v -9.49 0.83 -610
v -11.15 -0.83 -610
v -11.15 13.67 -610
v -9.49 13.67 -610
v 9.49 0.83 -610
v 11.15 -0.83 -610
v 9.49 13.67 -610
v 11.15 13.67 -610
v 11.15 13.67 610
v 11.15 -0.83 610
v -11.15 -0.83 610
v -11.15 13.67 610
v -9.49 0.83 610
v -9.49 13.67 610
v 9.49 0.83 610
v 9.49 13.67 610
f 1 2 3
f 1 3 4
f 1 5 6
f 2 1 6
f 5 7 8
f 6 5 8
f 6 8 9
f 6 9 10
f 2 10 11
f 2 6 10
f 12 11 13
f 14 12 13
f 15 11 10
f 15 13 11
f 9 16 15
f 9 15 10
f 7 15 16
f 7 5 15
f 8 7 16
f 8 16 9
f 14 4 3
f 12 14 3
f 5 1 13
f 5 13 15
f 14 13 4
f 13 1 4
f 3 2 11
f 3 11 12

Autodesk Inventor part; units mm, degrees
ref_plane "YZ Plane" through (0, 0, 0) normal (1, 0, 0) x (0, 1, 0)
ref_plane "XZ Plane" through (0, 0, 0) normal (0, 1, 0) x (-1, 0, 0)
ref_plane "XY Plane" through (0, 0, 0) normal (0, 0, 1) x (1, 0, 0)
sketch "Sketch1" plane through (0, 0, 0) normal (0, 0, 1) x (1, 0, 0)
  line L0 (-9.49, 0.83) -> (9.49, 0.83)
  line L1 (11.15, 1.3646) -> (11.15, -0.83)
  line L2 (11.15, -0.83) -> (-11.15, -0.83)
  line L3 (-11.15, -0.83) -> (-11.15, 1.0973)
  line L4 (-9.49, 0.83) -> (-9.49, 13.67)
  line L5 (-9.49, 13.67) -> (-11.15, 13.67)
  line L6 (-11.15, 13.67) -> (-11.15, 1.0973)
  line L7 (9.49, 0.83) -> (9.49, 13.67)
  line L8 (9.49, 13.67) -> (11.15, 13.67)
  line L9 (11.15, 13.67) -> (11.15, 1.3646)
  point P0 (0, 0)
  point P1 (0, 0)
  dimension "d0" = 22.3
  dimension "d1" = 11.15
  dimension "d3" = 0.83
  dimension "d4" = 14.5
  dimension "d5" = 1.66
  dimension "d6" = 1.66
  dimension "d7" = 14.5
  dimension "d10" = 1.66
extrude "Extrusion1" add sketch "Sketch1" along normal mid plane 1220
equation "\"d1\" = 0.5 * d0"
equation "\"d3\" = 0.5 * d10"
equation "\"d6\" = d5"
equation "\"d7\" = d4"
equation "\"d10\" = d5"
properties part number "Track"
